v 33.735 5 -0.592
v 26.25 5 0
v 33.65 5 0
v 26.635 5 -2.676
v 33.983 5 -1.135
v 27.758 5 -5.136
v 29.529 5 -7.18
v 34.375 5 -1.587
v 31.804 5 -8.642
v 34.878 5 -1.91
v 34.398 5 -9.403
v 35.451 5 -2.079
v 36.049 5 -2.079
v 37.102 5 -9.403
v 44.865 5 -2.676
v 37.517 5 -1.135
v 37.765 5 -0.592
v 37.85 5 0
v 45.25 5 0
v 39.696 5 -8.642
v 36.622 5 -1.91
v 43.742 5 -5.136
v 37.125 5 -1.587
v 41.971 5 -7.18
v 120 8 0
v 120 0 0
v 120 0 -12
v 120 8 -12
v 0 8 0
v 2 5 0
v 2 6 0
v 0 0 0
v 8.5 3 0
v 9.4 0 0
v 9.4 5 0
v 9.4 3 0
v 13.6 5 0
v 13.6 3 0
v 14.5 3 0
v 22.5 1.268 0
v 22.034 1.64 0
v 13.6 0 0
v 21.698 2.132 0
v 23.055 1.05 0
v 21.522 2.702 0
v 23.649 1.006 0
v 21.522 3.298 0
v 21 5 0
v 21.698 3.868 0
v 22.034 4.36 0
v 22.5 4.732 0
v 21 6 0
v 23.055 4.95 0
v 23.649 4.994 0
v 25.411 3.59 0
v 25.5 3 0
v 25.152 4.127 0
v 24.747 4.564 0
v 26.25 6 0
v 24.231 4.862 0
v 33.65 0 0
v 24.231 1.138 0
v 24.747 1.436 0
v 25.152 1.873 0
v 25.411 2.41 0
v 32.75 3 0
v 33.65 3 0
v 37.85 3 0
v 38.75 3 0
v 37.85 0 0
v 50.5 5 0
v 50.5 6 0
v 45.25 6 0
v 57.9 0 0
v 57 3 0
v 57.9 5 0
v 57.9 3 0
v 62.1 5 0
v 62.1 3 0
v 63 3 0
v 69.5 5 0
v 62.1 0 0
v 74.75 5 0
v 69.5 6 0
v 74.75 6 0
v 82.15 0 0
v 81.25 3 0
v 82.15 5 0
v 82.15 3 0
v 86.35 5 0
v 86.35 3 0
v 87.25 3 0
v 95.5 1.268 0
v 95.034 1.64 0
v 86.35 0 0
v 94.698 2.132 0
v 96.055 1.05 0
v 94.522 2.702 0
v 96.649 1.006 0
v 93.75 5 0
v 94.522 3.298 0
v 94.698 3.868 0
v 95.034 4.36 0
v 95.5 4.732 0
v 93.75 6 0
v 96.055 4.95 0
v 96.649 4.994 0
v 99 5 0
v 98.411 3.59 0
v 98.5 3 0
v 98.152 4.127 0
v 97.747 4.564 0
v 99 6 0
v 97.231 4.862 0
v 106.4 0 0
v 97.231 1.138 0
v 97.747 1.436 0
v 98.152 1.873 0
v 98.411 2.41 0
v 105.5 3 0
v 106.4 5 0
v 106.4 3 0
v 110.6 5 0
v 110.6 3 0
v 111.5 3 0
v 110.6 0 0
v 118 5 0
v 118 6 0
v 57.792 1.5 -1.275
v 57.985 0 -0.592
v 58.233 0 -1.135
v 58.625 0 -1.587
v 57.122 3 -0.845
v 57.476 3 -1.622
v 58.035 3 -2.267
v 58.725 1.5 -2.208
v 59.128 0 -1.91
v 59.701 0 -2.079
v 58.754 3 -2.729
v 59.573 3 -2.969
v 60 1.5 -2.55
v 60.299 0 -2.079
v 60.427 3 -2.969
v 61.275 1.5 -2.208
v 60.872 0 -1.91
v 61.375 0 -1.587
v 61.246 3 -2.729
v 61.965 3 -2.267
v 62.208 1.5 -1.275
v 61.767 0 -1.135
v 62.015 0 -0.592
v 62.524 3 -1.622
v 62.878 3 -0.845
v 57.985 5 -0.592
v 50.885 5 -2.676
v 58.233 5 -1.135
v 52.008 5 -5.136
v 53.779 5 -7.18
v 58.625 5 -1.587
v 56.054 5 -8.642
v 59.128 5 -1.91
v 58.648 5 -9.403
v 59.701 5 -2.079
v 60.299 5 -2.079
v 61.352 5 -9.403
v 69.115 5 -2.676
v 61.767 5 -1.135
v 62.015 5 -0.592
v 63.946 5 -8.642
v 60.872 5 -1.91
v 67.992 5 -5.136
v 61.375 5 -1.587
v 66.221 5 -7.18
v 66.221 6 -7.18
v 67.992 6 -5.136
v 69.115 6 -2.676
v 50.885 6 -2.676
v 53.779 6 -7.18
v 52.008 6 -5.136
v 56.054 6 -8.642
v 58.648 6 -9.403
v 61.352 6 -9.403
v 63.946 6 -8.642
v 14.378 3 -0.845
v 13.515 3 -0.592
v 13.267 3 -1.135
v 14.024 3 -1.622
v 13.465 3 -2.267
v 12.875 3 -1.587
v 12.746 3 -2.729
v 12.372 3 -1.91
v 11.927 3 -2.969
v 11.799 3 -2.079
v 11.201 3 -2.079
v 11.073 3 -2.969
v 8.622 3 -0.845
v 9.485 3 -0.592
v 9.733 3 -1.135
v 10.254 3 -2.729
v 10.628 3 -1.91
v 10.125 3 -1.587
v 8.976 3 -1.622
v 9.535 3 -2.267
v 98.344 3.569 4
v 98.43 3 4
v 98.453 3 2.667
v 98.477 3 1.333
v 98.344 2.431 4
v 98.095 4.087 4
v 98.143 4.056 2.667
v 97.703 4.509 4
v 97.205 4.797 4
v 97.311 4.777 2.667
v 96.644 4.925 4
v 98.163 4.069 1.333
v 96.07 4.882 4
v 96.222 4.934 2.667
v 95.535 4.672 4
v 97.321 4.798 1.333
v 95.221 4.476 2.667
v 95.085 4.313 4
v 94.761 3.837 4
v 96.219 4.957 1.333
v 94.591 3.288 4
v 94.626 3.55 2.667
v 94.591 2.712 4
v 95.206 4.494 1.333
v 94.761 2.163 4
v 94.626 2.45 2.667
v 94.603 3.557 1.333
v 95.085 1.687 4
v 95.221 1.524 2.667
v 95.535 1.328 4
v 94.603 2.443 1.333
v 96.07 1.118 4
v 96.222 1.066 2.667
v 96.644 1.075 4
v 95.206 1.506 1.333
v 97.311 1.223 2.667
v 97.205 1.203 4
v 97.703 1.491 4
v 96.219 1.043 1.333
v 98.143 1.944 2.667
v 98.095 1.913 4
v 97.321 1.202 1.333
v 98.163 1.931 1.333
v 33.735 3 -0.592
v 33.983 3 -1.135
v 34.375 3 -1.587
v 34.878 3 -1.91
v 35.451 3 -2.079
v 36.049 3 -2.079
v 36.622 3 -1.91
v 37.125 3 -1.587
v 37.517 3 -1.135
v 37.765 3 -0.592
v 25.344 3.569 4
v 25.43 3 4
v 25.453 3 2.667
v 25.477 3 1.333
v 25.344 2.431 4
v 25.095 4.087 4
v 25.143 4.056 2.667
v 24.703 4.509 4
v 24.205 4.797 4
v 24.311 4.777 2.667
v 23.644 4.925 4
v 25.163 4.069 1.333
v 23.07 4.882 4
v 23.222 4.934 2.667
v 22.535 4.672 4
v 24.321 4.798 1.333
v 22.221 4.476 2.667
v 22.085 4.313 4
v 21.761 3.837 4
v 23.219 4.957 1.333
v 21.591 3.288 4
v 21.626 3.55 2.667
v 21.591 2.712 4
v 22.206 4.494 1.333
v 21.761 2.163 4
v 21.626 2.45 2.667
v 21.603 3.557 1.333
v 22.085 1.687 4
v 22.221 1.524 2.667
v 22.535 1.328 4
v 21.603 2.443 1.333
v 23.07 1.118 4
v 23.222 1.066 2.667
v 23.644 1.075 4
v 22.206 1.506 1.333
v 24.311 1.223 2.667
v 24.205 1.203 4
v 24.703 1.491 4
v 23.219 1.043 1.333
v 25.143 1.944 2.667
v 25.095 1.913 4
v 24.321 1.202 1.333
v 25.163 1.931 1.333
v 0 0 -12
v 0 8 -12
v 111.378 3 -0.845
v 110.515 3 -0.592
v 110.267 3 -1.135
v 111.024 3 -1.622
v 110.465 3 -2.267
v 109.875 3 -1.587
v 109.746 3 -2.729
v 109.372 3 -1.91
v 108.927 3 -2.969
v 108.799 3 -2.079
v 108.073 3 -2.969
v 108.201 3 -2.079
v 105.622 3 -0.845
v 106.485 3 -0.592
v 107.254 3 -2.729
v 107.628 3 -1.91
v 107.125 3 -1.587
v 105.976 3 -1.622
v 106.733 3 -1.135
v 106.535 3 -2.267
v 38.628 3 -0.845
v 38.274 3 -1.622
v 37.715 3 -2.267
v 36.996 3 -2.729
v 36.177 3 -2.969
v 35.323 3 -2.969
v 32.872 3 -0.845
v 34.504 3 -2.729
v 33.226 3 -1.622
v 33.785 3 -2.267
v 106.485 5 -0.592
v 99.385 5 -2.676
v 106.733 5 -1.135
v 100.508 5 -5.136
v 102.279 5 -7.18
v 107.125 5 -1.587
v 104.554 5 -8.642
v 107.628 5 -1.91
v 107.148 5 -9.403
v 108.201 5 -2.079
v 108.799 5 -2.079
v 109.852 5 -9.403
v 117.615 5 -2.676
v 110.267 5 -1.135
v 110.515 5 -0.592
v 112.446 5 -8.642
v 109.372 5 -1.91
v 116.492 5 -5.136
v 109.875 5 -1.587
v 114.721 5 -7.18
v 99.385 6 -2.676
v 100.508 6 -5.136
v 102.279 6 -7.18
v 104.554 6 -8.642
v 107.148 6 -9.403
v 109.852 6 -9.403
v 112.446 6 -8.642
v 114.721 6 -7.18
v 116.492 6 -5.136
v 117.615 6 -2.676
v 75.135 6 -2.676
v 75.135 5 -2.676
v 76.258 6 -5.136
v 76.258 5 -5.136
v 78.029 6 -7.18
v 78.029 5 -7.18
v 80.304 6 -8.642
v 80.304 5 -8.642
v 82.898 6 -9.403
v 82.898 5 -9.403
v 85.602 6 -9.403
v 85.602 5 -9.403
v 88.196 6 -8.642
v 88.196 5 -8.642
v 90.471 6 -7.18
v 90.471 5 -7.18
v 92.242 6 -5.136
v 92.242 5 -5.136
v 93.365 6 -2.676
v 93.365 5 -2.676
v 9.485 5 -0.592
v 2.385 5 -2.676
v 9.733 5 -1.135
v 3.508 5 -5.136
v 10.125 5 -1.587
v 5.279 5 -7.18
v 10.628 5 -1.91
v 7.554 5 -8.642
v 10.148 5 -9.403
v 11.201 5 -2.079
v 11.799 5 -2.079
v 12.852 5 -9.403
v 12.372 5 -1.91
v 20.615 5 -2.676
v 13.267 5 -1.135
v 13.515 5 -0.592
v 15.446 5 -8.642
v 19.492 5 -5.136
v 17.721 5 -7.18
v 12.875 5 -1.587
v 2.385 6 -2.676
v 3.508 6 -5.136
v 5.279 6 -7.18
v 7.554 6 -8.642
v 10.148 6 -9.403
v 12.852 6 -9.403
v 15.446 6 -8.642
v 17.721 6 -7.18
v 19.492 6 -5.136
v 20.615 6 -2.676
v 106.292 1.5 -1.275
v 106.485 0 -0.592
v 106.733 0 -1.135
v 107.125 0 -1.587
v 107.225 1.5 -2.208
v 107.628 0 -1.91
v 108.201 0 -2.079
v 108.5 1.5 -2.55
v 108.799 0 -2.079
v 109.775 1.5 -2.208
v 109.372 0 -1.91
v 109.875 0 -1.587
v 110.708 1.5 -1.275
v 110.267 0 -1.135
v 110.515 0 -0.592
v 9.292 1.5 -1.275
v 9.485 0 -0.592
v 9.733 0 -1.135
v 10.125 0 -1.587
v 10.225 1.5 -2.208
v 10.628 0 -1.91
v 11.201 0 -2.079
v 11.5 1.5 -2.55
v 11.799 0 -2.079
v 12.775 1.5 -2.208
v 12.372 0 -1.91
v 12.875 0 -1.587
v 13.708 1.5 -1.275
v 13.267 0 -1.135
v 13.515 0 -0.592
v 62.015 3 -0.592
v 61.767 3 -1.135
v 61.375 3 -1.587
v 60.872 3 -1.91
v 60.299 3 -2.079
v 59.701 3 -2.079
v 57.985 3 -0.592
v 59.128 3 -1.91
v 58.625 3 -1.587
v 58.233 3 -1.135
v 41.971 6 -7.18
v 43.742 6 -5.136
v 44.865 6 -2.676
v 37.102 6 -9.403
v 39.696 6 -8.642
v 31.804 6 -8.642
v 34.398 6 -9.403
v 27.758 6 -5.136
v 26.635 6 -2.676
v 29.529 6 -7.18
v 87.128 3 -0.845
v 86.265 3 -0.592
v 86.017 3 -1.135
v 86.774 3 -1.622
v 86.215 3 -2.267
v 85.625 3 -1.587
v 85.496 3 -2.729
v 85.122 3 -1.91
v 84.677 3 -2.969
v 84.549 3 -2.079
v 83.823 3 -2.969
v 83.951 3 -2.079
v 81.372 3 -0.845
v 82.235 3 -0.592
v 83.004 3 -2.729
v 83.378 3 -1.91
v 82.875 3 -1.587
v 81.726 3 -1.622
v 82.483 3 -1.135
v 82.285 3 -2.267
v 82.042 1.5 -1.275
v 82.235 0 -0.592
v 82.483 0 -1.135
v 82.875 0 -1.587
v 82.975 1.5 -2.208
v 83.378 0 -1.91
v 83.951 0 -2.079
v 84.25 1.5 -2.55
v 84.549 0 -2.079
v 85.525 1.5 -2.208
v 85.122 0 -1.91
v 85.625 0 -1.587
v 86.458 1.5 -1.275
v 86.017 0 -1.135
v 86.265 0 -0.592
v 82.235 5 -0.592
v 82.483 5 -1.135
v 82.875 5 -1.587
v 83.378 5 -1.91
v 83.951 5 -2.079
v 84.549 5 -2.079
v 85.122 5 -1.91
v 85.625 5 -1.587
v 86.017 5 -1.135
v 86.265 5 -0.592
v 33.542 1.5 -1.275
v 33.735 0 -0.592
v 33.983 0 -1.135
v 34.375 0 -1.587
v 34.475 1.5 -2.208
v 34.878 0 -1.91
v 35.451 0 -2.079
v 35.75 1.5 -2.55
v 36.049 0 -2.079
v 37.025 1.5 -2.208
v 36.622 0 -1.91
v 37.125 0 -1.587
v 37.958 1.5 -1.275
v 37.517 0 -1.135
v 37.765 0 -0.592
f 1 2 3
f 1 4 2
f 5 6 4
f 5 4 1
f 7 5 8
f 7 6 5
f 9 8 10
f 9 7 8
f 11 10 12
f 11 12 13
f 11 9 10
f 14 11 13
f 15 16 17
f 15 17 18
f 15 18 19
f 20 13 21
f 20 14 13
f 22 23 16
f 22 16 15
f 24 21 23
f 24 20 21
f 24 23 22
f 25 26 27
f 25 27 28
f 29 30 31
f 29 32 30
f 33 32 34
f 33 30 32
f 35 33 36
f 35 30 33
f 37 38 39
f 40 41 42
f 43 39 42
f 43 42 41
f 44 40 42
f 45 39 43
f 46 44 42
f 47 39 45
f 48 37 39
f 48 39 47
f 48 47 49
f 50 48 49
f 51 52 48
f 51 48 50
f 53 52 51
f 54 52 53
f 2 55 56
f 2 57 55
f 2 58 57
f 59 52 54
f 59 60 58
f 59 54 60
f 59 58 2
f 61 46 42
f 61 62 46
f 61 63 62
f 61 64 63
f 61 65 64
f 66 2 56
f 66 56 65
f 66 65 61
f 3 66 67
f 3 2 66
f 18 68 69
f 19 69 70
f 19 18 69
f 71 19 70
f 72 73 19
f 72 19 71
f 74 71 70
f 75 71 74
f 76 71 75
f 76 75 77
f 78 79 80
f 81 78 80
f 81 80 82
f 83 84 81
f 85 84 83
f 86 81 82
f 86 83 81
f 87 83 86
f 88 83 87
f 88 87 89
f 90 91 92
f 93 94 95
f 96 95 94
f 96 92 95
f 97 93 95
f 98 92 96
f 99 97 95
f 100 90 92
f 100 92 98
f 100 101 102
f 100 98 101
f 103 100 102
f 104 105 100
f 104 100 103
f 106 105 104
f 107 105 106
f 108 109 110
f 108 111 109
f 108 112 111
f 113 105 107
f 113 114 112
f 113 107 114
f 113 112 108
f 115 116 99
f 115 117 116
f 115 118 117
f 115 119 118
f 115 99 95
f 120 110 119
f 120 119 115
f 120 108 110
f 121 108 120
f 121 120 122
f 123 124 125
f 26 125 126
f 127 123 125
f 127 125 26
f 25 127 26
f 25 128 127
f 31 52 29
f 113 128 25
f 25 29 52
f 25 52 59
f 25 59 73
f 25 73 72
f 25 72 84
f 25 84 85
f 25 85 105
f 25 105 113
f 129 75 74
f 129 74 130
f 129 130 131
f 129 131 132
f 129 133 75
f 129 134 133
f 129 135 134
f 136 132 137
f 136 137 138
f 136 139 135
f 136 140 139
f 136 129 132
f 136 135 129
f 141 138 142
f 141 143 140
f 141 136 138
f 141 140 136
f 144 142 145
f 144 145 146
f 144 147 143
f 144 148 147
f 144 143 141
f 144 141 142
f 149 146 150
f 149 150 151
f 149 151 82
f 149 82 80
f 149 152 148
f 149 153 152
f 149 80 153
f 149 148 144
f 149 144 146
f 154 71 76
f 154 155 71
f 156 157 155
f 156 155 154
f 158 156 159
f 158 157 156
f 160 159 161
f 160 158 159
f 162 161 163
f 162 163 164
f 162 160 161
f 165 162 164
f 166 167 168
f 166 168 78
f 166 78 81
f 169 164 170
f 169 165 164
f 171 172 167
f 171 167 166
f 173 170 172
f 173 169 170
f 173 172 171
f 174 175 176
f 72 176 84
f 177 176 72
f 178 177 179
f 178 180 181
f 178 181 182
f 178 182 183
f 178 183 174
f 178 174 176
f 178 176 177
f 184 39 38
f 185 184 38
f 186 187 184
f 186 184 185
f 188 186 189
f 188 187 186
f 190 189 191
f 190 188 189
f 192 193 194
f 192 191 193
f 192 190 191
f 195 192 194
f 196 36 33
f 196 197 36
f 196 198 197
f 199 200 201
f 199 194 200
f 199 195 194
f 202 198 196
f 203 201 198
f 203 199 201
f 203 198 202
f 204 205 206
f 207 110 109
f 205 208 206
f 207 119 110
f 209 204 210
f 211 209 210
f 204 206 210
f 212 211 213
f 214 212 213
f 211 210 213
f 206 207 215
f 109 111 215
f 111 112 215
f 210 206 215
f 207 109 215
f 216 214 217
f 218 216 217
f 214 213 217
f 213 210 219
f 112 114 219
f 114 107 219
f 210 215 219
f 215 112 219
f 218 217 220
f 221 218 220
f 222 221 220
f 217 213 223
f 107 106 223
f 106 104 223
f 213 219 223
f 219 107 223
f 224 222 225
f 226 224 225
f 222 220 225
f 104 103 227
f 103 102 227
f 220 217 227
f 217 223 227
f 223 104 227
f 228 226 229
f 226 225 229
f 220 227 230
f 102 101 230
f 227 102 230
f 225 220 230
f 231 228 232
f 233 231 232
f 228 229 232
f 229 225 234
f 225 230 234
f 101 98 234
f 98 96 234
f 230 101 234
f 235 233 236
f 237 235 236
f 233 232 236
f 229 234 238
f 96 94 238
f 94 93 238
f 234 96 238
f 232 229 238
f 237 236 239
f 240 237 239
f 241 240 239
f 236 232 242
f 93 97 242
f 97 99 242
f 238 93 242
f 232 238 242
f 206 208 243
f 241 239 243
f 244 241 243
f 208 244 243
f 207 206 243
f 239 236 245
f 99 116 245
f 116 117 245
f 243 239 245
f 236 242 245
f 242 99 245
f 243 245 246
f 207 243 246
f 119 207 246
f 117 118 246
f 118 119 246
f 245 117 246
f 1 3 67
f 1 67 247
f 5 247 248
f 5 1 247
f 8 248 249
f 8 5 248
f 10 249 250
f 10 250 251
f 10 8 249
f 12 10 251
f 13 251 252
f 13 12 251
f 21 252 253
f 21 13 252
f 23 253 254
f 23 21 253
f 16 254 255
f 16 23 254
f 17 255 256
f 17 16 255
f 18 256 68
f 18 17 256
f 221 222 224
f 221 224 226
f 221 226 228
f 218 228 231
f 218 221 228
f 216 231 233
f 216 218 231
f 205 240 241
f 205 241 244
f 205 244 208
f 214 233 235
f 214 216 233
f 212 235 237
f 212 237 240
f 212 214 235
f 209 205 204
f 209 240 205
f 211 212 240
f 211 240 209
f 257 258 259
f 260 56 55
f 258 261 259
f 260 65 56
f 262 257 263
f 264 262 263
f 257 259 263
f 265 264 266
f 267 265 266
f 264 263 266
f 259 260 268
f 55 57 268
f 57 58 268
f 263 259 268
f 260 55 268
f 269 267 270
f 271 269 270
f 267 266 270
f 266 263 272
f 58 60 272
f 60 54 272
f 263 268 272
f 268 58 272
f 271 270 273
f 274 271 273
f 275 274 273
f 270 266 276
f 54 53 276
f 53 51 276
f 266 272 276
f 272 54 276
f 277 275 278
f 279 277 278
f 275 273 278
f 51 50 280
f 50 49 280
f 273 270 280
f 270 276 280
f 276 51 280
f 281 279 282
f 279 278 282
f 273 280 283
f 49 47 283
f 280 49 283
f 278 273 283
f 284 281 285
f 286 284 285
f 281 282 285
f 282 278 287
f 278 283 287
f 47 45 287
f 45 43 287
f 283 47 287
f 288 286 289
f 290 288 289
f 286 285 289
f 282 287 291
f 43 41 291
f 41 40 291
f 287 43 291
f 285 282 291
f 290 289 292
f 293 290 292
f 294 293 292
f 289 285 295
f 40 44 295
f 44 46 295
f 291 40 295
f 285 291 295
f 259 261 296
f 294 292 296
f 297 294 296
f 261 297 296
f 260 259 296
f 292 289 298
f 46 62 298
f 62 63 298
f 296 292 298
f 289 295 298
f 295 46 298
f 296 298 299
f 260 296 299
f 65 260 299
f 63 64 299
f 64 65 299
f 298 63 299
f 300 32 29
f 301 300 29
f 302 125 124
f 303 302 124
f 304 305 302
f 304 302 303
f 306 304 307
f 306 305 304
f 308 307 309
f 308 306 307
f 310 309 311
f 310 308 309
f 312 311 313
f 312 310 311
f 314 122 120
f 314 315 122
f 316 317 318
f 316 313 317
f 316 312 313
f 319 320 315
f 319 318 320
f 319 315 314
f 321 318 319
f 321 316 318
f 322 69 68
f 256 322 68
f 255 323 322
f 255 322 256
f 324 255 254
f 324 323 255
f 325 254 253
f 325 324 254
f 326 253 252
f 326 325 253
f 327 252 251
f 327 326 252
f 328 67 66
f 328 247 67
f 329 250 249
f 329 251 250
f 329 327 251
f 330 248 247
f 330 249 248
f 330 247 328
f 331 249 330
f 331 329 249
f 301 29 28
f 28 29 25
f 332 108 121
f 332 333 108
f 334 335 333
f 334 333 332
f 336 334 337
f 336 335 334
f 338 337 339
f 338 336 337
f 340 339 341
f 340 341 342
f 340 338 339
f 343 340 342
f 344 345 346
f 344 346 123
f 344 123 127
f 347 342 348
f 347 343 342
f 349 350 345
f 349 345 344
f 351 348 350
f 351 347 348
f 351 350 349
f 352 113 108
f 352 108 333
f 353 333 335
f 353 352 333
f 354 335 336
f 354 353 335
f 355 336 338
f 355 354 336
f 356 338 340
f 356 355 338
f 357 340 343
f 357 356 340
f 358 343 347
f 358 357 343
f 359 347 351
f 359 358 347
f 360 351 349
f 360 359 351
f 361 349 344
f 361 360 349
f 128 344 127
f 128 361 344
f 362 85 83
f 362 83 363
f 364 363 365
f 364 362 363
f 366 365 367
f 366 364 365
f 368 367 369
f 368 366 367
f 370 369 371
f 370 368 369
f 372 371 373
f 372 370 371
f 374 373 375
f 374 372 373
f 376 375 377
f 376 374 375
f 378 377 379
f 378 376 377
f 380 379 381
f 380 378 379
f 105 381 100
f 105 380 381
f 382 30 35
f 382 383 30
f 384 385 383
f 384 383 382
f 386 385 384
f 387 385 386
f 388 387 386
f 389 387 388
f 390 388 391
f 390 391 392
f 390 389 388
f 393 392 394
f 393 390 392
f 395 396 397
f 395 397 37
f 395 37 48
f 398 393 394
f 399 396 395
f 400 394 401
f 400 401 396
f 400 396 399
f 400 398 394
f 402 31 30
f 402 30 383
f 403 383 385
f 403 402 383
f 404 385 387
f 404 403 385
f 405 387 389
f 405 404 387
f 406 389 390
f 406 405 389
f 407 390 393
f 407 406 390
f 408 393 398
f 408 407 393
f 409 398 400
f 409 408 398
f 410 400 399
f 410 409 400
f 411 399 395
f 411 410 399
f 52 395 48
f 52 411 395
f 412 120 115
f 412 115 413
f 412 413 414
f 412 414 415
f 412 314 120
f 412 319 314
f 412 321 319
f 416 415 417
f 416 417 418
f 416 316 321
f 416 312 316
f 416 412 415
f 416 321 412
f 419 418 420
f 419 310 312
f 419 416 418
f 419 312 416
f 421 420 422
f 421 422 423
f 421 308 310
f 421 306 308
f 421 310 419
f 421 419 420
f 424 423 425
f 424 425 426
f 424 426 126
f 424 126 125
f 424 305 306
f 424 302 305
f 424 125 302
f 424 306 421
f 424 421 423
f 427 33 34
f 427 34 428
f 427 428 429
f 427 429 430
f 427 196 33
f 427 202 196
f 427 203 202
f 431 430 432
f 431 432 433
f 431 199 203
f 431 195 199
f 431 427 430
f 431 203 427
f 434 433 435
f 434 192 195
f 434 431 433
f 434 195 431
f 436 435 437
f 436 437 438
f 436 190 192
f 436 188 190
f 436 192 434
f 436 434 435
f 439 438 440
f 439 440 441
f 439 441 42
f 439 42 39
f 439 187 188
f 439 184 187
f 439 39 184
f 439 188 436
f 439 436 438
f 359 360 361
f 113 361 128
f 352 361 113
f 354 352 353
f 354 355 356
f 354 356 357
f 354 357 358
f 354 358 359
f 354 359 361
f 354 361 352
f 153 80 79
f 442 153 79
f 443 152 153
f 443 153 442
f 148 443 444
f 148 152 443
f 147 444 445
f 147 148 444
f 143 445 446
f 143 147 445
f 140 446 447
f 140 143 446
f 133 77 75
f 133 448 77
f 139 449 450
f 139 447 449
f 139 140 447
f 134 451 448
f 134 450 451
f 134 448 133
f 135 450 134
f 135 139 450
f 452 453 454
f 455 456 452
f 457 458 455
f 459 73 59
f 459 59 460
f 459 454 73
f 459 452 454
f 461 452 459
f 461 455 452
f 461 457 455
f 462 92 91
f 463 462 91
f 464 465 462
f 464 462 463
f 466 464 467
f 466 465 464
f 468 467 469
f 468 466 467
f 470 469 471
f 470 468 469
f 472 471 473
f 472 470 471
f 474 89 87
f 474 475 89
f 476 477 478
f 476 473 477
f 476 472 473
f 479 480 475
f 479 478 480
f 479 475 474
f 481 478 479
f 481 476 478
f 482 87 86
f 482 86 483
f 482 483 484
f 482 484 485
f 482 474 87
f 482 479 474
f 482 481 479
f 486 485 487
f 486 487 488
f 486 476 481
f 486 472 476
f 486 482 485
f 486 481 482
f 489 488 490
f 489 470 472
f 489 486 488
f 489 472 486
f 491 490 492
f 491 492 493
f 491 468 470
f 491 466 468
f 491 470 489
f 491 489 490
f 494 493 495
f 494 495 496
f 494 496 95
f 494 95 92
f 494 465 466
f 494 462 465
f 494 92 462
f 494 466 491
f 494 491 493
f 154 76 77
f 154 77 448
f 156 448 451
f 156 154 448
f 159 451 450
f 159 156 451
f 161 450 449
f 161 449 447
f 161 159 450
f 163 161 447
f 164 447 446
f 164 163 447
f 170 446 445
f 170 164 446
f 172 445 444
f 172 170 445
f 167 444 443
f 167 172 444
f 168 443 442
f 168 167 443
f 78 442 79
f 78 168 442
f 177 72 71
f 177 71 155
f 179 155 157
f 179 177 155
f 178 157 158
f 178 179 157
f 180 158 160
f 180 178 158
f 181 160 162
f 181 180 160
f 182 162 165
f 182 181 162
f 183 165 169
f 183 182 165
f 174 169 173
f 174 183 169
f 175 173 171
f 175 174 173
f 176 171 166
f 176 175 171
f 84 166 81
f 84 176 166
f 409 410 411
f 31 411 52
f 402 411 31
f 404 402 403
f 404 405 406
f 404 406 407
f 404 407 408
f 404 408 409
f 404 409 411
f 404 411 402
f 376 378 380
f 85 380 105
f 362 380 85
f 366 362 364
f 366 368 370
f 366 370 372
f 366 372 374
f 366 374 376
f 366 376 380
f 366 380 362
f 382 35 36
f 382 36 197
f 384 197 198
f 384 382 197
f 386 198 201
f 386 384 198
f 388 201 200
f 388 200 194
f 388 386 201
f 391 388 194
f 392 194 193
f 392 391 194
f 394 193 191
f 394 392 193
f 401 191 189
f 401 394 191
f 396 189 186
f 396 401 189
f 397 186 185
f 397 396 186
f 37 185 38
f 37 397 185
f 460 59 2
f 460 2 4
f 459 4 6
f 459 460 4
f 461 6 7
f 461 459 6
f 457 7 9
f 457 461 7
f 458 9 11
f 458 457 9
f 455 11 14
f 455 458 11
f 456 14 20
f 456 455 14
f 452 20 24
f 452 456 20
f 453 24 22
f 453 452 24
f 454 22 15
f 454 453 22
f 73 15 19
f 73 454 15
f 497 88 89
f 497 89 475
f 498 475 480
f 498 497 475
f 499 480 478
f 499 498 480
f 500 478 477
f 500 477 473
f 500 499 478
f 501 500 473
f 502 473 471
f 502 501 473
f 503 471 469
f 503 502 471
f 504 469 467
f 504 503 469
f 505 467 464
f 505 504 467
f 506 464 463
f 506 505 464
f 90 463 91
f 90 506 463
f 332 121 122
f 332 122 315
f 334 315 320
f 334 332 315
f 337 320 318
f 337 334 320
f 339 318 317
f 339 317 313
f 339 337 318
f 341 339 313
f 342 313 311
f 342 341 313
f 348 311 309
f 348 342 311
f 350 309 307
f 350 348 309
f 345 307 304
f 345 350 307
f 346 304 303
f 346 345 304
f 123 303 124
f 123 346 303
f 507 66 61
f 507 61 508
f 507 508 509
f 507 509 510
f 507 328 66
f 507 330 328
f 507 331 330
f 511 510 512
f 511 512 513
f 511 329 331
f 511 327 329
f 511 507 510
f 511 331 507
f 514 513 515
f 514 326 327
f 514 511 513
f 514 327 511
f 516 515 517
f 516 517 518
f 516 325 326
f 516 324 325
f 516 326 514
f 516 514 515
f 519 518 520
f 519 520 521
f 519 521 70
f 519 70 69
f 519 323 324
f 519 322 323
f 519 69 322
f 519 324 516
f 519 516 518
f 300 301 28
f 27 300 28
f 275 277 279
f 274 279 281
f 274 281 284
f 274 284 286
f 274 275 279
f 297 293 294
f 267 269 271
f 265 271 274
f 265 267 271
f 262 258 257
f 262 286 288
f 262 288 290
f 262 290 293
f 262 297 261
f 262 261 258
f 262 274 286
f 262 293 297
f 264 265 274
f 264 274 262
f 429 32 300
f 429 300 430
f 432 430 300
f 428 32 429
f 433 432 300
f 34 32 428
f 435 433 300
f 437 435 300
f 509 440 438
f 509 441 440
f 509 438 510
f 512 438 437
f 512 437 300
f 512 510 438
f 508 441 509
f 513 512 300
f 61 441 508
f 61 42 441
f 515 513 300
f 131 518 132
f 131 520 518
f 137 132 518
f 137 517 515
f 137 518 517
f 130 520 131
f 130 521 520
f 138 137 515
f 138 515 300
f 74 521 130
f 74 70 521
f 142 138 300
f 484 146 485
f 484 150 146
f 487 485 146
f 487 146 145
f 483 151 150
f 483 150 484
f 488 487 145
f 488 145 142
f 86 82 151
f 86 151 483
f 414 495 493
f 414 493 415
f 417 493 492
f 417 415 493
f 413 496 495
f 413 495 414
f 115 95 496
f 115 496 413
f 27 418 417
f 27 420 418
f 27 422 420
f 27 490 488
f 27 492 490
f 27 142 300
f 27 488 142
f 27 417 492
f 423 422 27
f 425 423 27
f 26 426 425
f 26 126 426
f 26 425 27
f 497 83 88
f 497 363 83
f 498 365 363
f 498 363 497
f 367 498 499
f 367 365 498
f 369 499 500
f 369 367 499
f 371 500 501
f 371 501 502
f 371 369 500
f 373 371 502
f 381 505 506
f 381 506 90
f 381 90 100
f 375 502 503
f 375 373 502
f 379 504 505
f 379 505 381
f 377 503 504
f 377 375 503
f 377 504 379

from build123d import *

# Parameters (mm, degrees)
SKETCH2_W                     = 120
SKETCH2_H                     = 8
BOSS_EXTRUDE1_DEPTH           = 12
LPATTERN1_COUNT               = 5
LPATTERN1_PITCH               = 24.25
SKETCH4_R                     = 2
BOSS_EXTRUDE2_DEPTH           = 4
BOSS_EXTRUDE2_DRAFT           = 1
BOSS_EXTRUDE2_PROFILE_2_DEPTH = 4
BOSS_EXTRUDE2_PROFILE_2_DRAFT = 1


with BuildPart() as part:
    # Sketch2 → Boss-Extrude1 (new body)
    with BuildSketch(Plane.XY):
        with Locations((60, 4)):
            Rectangle(SKETCH2_W, SKETCH2_H)
    extrude(amount=-BOSS_EXTRUDE1_DEPTH)

    # Sketch3 → Cut-Revolve1 (revolve, cut)
    with BuildSketch(Plane.XY):
        Polygon((8.5, 3), (9.4, 3), (9.4, 5), (2, 5), (2, 6), (11.5, 6), (11.5, 0), (9.4, 0), align=None)
    cut_revolve1 = revolve(axis=Axis((11.5, 6, 0), (0, -1, 0)), mode=Mode.SUBTRACT)

    # LPattern1: Cut-Revolve1 ×5
    with Locations(*[(i * LPATTERN1_PITCH, 0, 0) for i in range(1, LPATTERN1_COUNT)]):
        add(cut_revolve1, mode=Mode.SUBTRACT)


with BuildPart() as boss_extrude2_tool:
    # Sketch4 → Boss-Extrude2 (with draft: the straight prism first)
    with BuildSketch(Plane.XY):
        with Locations((23.5, 3)):
            Circle(SKETCH4_R)
    extrude(amount=BOSS_EXTRUDE2_DEPTH)
    # Boss-Extrude2: the draft: its side faces are tilted about the plane it starts from
    boss_extrude2_sides = [boss_extrude2_tool.faces().sort_by_distance(p)[0] for p in [
        (21.5, 3, 2),
    ]]
    draft(boss_extrude2_sides, Plane.XY, BOSS_EXTRUDE2_DRAFT)


with BuildPart() as part_1:
    add(part.part)

    # Boss-Extrude2: add boss_extrude2_tool
    add(boss_extrude2_tool.part)


with BuildPart() as boss_extrude2_profile_2_tool:
    # Sketch4 → Boss-Extrude2 profile 2 (with draft: the straight prism first)
    with BuildSketch(Plane.XY):
        with Locations((96.5, 3)):
            Circle(SKETCH4_R)
    extrude(amount=BOSS_EXTRUDE2_PROFILE_2_DEPTH)
    # Boss-Extrude2 profile 2: the draft: its side faces are tilted about the plane it starts from
    boss_extrude2_profile_2_sides = [boss_extrude2_profile_2_tool.faces().sort_by_distance(p)[0] for p in [
        (94.5, 3, 2),
    ]]
    draft(boss_extrude2_profile_2_sides, Plane.XY, BOSS_EXTRUDE2_PROFILE_2_DRAFT)


with BuildPart() as part_2:
    add(part_1.part)

    # Boss-Extrude2 profile 2: add boss_extrude2_profile_2_tool
    add(boss_extrude2_profile_2_tool.part)


solid = part_2.part
